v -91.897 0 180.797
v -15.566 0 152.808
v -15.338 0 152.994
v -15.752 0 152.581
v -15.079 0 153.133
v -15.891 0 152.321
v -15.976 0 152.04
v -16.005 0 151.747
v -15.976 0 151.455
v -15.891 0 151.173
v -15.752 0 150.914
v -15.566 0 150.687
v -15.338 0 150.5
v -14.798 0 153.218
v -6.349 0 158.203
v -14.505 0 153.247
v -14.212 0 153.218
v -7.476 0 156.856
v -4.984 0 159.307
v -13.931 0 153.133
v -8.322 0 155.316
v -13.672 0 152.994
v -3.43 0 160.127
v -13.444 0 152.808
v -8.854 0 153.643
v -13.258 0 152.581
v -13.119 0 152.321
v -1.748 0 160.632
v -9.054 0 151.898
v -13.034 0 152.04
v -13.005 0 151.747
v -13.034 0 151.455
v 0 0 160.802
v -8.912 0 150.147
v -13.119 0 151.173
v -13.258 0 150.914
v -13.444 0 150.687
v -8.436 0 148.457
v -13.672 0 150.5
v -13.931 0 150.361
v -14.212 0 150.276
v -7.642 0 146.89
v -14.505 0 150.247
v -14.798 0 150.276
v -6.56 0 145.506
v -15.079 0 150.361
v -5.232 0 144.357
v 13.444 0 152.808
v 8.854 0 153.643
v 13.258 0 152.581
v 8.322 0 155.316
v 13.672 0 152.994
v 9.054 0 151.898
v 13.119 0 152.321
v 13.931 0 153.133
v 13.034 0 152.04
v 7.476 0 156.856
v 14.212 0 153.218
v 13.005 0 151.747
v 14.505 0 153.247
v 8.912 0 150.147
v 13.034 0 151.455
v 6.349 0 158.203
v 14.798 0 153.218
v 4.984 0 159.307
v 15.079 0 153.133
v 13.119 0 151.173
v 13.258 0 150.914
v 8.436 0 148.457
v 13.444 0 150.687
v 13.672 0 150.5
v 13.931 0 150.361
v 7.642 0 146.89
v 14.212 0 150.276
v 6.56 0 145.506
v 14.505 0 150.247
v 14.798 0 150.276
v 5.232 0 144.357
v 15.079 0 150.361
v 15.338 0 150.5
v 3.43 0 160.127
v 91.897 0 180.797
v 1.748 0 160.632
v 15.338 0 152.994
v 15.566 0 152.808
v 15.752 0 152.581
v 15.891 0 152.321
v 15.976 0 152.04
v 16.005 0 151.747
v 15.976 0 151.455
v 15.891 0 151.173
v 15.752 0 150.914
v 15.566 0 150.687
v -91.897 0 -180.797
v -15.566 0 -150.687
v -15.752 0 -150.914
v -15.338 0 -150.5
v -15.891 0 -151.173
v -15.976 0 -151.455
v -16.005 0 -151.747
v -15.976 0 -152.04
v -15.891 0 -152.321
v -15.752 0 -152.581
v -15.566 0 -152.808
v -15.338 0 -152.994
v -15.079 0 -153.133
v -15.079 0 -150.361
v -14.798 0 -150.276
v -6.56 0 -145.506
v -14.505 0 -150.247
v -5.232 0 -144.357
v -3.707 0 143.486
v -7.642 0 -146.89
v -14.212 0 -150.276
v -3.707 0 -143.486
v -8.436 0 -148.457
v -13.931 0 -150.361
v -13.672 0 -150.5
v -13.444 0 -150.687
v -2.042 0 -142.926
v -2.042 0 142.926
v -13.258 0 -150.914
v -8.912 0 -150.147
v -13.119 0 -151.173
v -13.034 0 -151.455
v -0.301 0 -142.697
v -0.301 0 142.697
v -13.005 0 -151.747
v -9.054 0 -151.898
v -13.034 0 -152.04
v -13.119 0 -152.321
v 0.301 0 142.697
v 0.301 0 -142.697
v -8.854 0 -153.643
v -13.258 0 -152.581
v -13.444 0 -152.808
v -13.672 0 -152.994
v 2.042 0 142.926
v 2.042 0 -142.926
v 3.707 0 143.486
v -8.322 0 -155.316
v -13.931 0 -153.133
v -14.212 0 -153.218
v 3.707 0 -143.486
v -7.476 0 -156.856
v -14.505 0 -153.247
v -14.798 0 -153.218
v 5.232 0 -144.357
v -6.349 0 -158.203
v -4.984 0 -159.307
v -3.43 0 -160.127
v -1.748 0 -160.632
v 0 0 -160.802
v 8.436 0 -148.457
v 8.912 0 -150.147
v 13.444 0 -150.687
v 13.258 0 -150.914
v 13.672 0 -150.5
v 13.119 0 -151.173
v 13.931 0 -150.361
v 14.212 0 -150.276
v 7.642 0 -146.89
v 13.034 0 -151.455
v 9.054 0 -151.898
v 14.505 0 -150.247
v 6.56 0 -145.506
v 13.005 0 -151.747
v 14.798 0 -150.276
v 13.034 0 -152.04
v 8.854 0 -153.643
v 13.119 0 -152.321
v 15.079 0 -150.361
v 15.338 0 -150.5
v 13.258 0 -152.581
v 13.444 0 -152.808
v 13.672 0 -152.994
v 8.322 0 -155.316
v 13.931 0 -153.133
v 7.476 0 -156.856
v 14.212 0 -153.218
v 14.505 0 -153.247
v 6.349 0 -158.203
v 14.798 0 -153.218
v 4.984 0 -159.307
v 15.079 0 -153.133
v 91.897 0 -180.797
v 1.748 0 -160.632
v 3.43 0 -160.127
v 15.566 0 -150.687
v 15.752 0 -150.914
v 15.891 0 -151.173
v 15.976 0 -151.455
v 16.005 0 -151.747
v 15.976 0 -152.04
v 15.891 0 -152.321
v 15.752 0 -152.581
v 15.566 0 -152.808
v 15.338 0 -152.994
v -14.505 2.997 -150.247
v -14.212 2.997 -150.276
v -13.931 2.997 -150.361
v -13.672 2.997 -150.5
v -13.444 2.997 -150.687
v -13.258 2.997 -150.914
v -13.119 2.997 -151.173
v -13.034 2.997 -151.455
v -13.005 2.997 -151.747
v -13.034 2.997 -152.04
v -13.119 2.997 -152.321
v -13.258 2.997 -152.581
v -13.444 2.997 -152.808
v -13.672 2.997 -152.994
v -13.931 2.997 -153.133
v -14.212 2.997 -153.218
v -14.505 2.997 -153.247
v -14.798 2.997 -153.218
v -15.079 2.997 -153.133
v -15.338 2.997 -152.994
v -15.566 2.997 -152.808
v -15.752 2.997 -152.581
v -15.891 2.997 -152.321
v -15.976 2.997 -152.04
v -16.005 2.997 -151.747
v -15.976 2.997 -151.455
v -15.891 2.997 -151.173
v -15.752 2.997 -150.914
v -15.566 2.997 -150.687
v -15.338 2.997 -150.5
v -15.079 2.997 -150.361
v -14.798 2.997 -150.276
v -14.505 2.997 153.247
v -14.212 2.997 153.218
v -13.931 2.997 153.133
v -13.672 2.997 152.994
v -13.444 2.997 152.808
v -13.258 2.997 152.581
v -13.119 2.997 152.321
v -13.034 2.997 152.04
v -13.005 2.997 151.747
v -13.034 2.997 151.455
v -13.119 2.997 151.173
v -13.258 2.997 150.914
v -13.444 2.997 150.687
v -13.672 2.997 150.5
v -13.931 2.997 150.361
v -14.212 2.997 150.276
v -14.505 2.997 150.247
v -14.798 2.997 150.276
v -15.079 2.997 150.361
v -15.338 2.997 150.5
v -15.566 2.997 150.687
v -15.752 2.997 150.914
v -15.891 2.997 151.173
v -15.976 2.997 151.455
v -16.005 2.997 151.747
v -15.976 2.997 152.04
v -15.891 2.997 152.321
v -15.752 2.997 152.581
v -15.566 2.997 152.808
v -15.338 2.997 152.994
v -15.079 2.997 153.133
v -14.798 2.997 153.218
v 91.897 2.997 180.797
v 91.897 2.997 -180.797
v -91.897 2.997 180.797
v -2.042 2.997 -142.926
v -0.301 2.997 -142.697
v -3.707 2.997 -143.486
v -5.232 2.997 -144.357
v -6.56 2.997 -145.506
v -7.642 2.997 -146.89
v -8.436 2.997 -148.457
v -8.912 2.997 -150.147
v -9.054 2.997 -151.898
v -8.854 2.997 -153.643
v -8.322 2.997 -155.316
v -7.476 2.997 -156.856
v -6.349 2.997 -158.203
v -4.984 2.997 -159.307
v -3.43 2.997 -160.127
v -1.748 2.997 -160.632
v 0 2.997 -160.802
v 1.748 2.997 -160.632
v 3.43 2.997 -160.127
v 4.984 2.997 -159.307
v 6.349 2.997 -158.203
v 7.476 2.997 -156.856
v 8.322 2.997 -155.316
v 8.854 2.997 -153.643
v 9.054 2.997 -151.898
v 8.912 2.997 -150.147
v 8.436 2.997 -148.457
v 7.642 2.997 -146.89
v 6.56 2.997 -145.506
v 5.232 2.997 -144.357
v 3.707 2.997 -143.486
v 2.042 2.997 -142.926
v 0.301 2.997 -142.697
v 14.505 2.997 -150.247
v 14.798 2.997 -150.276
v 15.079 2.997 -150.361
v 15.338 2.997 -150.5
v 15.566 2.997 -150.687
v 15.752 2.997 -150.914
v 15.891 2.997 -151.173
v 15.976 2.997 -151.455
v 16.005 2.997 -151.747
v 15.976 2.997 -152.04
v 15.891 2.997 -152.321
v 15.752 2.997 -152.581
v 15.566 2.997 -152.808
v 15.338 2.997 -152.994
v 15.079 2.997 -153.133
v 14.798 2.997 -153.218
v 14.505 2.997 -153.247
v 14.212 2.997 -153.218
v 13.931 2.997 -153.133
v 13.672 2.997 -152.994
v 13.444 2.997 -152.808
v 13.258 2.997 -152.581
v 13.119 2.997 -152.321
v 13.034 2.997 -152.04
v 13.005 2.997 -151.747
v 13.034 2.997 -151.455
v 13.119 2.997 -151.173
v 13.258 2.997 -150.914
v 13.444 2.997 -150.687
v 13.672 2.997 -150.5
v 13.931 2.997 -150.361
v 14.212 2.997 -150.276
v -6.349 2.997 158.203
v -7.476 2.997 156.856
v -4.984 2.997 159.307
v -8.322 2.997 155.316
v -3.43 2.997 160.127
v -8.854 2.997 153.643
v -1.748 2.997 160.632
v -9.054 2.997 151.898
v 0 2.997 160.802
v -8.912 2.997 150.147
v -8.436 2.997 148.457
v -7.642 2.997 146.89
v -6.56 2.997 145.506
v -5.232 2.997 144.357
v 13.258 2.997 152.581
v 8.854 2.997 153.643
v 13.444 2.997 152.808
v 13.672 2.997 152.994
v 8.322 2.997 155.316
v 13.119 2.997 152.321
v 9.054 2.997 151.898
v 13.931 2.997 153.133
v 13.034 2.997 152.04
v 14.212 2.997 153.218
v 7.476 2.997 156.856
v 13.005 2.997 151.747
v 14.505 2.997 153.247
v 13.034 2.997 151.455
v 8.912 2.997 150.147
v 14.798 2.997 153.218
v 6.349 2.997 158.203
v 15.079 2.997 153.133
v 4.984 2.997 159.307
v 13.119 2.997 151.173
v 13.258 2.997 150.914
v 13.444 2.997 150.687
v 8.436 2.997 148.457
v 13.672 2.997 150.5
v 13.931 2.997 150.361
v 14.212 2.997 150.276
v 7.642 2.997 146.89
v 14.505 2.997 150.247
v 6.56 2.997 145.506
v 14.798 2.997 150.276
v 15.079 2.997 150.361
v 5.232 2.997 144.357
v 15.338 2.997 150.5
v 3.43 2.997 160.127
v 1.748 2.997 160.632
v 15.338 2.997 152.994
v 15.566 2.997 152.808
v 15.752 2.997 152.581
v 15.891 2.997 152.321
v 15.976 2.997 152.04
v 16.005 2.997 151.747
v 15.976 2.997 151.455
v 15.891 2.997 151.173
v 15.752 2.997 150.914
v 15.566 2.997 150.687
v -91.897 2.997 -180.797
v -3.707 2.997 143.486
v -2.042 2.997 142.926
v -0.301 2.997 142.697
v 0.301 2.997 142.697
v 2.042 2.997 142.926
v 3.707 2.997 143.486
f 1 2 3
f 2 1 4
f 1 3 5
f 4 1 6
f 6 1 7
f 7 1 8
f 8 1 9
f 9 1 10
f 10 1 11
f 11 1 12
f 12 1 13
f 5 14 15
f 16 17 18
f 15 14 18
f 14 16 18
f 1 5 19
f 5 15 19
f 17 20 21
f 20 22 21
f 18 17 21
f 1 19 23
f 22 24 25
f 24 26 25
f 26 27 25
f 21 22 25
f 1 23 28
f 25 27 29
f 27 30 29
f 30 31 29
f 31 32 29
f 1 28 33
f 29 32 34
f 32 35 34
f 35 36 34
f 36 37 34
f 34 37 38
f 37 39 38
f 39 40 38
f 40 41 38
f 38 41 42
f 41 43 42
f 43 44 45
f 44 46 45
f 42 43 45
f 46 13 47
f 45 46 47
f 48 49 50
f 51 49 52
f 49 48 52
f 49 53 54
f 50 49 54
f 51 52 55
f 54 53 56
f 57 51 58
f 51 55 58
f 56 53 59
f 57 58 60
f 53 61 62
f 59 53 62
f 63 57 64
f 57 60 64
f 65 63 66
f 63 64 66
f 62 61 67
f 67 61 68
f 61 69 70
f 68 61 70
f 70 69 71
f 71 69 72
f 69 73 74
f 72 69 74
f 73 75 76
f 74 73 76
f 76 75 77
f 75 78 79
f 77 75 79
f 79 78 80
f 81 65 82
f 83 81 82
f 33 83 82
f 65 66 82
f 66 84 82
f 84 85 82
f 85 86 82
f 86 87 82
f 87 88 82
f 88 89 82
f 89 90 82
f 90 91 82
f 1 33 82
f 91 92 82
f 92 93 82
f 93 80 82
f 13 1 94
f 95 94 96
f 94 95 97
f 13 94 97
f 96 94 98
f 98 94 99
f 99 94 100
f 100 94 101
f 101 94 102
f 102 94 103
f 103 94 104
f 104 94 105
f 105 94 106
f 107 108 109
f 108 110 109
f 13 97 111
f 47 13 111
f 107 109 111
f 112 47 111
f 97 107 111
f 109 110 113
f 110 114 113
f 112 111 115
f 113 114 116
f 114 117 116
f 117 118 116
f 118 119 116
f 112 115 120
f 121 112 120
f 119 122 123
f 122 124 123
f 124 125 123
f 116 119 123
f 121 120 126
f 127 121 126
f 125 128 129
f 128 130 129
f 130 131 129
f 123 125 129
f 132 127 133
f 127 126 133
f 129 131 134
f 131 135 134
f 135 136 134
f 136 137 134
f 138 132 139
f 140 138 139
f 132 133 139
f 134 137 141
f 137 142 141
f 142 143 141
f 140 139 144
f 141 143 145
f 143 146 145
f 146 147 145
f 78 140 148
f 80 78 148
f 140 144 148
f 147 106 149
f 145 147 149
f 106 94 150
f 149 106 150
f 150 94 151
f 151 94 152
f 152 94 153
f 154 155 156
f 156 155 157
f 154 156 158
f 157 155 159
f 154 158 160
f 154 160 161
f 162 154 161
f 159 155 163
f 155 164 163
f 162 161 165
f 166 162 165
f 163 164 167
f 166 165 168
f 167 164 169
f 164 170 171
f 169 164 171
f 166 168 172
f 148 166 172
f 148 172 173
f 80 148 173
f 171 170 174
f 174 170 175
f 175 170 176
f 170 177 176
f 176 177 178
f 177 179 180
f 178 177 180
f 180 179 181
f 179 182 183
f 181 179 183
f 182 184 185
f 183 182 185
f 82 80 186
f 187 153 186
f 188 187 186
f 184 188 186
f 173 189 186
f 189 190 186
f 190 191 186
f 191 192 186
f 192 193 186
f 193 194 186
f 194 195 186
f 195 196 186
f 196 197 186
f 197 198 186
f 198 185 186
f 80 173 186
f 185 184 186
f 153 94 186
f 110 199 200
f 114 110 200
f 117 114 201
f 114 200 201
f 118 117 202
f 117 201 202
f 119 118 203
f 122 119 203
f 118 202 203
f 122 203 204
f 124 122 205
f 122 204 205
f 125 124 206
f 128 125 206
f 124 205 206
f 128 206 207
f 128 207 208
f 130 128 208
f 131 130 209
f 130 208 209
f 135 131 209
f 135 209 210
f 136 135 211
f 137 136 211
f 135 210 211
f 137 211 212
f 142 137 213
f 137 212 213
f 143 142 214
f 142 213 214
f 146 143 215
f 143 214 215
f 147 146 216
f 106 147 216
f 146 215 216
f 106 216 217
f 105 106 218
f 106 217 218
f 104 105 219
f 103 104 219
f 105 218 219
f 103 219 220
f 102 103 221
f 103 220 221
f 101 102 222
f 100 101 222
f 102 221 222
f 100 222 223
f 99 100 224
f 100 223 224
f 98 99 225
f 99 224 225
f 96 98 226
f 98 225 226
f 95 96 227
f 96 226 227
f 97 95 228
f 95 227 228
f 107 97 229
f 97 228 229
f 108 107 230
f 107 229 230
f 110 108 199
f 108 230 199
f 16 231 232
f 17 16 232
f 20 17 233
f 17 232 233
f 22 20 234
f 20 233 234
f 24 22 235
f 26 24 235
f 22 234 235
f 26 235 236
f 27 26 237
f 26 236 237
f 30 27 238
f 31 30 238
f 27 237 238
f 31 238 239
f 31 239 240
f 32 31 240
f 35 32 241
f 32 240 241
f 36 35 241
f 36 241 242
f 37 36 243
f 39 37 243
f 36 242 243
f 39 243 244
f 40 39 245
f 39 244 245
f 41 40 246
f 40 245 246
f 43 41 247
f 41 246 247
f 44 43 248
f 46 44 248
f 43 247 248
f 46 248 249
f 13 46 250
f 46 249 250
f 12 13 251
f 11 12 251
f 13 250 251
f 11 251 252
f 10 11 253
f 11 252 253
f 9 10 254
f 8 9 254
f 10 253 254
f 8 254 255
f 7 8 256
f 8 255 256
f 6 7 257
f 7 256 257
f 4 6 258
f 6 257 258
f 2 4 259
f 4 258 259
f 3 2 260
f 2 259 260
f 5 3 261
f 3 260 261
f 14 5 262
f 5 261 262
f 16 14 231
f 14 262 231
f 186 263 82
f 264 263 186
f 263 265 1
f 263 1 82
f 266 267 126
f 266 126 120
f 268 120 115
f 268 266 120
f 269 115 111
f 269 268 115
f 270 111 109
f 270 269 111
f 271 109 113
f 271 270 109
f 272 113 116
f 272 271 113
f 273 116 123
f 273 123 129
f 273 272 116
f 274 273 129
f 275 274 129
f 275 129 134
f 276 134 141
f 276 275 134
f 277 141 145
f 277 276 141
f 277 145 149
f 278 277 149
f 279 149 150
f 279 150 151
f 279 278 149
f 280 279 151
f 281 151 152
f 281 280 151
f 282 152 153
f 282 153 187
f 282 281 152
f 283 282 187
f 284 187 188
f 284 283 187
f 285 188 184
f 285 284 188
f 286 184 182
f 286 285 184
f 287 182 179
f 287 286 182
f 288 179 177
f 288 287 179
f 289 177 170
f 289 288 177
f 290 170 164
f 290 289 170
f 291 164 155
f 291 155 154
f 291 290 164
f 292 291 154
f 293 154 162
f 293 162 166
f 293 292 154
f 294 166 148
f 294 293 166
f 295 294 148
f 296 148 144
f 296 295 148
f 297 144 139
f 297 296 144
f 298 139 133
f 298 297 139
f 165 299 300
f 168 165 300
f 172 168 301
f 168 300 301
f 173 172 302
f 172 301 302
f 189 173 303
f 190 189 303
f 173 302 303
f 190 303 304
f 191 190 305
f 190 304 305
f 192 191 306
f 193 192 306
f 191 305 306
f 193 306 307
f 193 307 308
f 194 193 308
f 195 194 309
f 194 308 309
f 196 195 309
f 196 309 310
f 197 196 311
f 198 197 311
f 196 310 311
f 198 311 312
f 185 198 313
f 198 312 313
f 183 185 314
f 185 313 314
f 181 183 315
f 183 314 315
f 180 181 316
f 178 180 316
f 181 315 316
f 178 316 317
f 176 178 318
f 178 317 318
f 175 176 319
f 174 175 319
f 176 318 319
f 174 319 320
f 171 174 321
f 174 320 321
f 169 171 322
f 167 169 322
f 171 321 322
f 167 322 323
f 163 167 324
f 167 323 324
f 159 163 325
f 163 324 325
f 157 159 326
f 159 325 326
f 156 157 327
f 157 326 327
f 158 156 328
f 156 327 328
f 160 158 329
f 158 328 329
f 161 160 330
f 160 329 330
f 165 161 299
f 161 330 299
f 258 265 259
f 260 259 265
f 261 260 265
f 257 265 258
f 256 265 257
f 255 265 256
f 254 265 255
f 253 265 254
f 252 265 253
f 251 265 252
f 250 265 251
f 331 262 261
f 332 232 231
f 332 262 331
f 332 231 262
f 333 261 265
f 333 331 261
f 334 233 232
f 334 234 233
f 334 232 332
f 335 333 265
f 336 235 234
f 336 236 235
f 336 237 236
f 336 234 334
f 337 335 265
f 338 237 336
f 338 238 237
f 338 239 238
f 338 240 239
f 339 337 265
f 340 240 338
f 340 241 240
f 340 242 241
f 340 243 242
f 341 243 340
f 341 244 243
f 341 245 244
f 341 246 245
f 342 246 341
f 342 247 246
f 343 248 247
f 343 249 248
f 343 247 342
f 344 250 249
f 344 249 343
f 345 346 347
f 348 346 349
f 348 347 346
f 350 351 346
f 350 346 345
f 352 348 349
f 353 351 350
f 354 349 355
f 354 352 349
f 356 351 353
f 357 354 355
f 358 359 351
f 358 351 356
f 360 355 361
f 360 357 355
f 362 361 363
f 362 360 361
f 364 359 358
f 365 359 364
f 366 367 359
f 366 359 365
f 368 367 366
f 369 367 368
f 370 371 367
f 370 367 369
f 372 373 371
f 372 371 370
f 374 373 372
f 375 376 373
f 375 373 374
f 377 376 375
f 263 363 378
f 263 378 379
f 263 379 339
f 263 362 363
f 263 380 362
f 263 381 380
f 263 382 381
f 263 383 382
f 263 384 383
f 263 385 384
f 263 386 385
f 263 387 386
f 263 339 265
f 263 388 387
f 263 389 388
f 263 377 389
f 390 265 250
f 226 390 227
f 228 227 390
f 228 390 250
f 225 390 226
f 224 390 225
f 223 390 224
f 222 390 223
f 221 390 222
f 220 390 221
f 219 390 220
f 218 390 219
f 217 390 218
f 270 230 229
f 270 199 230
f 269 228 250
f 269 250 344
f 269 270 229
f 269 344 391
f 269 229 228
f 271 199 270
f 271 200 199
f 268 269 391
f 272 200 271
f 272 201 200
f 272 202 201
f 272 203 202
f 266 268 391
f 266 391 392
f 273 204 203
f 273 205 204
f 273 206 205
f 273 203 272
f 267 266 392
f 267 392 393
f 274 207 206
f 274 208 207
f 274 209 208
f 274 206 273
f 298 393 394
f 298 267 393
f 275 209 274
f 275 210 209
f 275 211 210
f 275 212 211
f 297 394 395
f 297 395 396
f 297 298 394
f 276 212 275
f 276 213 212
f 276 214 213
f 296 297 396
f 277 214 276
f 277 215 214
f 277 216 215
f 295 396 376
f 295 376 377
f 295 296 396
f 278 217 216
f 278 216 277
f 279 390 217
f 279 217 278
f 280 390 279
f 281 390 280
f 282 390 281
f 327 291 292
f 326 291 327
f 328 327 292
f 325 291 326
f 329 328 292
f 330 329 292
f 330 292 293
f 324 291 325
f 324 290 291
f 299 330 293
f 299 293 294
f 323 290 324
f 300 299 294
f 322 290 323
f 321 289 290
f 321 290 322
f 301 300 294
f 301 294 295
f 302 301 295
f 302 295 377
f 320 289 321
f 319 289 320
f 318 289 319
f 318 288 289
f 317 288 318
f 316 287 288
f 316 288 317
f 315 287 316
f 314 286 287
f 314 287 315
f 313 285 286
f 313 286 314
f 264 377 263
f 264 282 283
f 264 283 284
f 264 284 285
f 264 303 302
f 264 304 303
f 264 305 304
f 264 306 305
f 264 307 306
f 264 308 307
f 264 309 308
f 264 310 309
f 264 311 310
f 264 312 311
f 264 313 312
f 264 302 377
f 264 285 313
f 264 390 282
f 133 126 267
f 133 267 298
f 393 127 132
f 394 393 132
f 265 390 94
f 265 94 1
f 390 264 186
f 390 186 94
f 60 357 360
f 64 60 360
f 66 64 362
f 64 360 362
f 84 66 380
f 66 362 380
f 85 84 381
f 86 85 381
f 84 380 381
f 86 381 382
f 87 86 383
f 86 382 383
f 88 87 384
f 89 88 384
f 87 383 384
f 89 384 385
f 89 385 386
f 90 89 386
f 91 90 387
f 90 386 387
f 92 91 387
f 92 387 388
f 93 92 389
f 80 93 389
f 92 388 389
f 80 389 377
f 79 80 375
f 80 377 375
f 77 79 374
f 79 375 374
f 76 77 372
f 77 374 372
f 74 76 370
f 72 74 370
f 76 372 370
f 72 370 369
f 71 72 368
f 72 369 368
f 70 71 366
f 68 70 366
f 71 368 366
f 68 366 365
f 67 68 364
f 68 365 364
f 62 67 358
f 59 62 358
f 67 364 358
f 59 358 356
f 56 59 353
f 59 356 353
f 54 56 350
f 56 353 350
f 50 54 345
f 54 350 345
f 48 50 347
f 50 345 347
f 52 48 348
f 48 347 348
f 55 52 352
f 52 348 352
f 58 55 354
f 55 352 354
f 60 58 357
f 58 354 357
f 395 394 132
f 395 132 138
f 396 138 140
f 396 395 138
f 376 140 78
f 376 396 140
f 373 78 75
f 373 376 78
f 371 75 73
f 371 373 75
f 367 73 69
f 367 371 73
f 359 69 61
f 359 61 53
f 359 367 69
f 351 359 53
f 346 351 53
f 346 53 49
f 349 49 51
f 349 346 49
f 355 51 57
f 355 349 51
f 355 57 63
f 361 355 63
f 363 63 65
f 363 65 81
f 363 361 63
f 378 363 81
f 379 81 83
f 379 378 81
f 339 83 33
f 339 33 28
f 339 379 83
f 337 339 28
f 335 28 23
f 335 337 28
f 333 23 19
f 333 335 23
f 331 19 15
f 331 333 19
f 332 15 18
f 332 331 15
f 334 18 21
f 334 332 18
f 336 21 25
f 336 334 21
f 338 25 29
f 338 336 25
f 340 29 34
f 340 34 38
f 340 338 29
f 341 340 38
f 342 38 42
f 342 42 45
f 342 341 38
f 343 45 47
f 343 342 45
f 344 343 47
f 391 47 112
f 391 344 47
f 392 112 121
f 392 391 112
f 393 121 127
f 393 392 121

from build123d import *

# Parameters (mm, degrees)
SKETCH1_W           = 183.7944
SKETCH1_H           = 285.3944
BOSS_EXTRUDE1_DEPTH = 2.9972
SKETCH2_R           = 1.5
BOSS_EXTRUDE2_DEPTH = 2.9972


with BuildPart() as part:
    # Sketch1 → Boss-Extrude1 (new body)
    with BuildSketch(Plane(origin=(0, 0, 0), x_dir=(1, 0, 0), z_dir=(0, 1, 0))):
        Rectangle(SKETCH1_W, SKETCH1_H)
    extrude(amount=BOSS_EXTRUDE1_DEPTH)

    # Sketch2 → Boss-Extrude2 (add)
    # profile 1 of 2: a face of its own
    with BuildSketch(Plane(origin=(0, 2.9972, 0), x_dir=(1, 0, 0), z_dir=(0, 1, 0))):
        with BuildLine():
            Line((-0.300873728, -142.6972), (-91.8972, -142.6972))
            Line((-91.8972, -142.6972), (-91.8972, -180.7972))
            Line((-91.8972, -180.7972), (91.8972, -180.7972))
            Line((91.8972, -180.7972), (91.8972, -142.6972))
            Line((91.8972, -142.6972), (0.300873728, -142.6972))
            ThreePointArc((0.300873728, -142.6972), (0, -160.8022), (-0.300873728, -142.6972))
        make_face()
        with Locations(Location((-14.505, -151.7472, 0), (0, 0, 270))):
            Circle(SKETCH2_R, mode=Mode.SUBTRACT)
        with Locations(Location((14.505, -151.7472, 0), (0, 0, 270))):
            Circle(SKETCH2_R, mode=Mode.SUBTRACT)
    # profile 2 of 2: a face of its own
    with BuildSketch(Plane(origin=(0, 2.9972, 0), x_dir=(1, 0, 0), z_dir=(0, 1, 0))):
        with BuildLine():
            Line((0.300873728, 142.6972), (91.8972, 142.6972))
            Line((91.8972, 142.6972), (91.8972, 180.7972))
            Line((91.8972, 180.7972), (-91.8972, 180.7972))
            Line((-91.8972, 180.7972), (-91.8972, 142.6972))
            Line((-91.8972, 142.6972), (-0.300873728, 142.6972))
            ThreePointArc((-0.300873728, 142.6972), (0, 160.8022), (0.300873728, 142.6972))
        make_face()
        with Locations(Location((-14.505, 151.7472, 0), (0, 0, 270))):
            Circle(SKETCH2_R, mode=Mode.SUBTRACT)
        with Locations(Location((14.505, 151.7472, 0), (0, 0, 270))):
            Circle(SKETCH2_R, mode=Mode.SUBTRACT)
    extrude(amount=-BOSS_EXTRUDE2_DEPTH)


solid = part.part
